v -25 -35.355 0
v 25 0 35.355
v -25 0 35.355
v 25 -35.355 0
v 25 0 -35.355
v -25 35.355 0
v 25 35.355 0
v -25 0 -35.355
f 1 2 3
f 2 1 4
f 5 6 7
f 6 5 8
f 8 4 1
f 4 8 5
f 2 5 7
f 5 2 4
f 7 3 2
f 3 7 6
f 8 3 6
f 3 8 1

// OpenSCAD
color("orange")
	rotate([45,0,0])
		cube([50,50,50], center=true);

		
